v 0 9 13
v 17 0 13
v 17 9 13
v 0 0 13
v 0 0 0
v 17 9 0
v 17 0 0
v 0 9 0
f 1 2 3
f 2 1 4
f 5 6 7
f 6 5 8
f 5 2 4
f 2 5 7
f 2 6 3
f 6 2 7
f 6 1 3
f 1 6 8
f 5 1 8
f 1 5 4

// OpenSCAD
// Generated by SolidPython 1.0.1 on 2020-07-29 00:46:56


cube(size = [17, 9, 13]);
/***********************************************
*********      SolidPython code:      **********
************************************************
 
# import packages: SolidPython
from solid import *
from solid.utils import *
from itertools import chain, combinations, permutations


class Resize:

    def __init__(self, scad_file):
        self.scad_file = scad_file
        #self.scad_file = import_scad(scad_file)
        # cone/cylinder param:
        self.r1 = 0
        self.r2 = 0
        self.h = 0
        # rectangular prism param:
        self.w = 0
        self.l = 0
        # ellipse param:
        self.r = 0

    # import OpenScad code (file name corresponds to shape)


    # classify shape + parameters
    def assign(self, param1, param2, param3):
        if self.scad_file == 'cone.scad':
            self.r1 = param1
            self.r2 = param2
            self.h = param3
        elif self.scad_file == 'cylinder.scad':
            self.r1 = param1
            self.r2 = param2
            self.h = param3
        elif self.scad_file == 'rectangularPrism.scad':
            self.h = param1
            self.l = param2
            self.w = param3
        else:
            self.r = param1
            self.h = param2

    # resize parameters
    def iterate(self):
        x = range(3, 20, 2)
        i = 1
        if self.scad_file == 'cone.scad':
            tempList = list(permutations(x, 2))
            for temp in tempList:
                param1 = temp[0]
                param2 = temp[1]
                filepath = 'produced_scad_files/' + 'cone' + str(param1) + '_' + str(param2) + '_' + '.scad'
                scad_render_to_file(cylinder(h=param1, r1=param2, r2=0), filepath)

        elif self.scad_file == 'cylinder.scad':
            tempList = list(permutations(x, 3))
            for temp in tempList:
                param1 = temp[0]
                param2 = temp[1]
                filepath = 'produced_scad_files/' + 'cylinder' + str(param1) + '_' + str(param2) + '_' + '.scad'
                scad_render_to_file(cylinder(h=param1, r1=param2, r2=param2), filepath)

        elif self.scad_file == 'rectangularPrism.scad':
            tempList = list(permutations(x, 3))
            for temp in tempList:
                param1 = temp[0]
                param2 = temp[1]
                param3 = temp[2]
                filepath = 'produced_scad_files/' + 'rectangularPrism' + str(param1) + '_' + str(param2) + '_' + str(
                    param3) + '.scad'
                scad_render_to_file(cube(size=(param1, param2, param3)), filepath)

        elif self.scad_file == 'ellipse.scad':
            tempList = list(permutations(x, 4))
            for temp in tempList:
                param1 = temp[0]
                param2 = temp[1]
                param3 = temp[2]
                param4 = temp[3]
                filepath = 'produced_scad_files/' + 'ellipse' + str(param1) + '_' + str(param2) + '_' + str(param3) + '_' + str(param4) + '.scad'
                scad_render_to_file(scale([param1, param2, param3])(sphere(r=param4)), filepath)

    def render_to_scadfile(self):
        scad_render_to_file(scad, 'example.scad') 
 
************************************************/
